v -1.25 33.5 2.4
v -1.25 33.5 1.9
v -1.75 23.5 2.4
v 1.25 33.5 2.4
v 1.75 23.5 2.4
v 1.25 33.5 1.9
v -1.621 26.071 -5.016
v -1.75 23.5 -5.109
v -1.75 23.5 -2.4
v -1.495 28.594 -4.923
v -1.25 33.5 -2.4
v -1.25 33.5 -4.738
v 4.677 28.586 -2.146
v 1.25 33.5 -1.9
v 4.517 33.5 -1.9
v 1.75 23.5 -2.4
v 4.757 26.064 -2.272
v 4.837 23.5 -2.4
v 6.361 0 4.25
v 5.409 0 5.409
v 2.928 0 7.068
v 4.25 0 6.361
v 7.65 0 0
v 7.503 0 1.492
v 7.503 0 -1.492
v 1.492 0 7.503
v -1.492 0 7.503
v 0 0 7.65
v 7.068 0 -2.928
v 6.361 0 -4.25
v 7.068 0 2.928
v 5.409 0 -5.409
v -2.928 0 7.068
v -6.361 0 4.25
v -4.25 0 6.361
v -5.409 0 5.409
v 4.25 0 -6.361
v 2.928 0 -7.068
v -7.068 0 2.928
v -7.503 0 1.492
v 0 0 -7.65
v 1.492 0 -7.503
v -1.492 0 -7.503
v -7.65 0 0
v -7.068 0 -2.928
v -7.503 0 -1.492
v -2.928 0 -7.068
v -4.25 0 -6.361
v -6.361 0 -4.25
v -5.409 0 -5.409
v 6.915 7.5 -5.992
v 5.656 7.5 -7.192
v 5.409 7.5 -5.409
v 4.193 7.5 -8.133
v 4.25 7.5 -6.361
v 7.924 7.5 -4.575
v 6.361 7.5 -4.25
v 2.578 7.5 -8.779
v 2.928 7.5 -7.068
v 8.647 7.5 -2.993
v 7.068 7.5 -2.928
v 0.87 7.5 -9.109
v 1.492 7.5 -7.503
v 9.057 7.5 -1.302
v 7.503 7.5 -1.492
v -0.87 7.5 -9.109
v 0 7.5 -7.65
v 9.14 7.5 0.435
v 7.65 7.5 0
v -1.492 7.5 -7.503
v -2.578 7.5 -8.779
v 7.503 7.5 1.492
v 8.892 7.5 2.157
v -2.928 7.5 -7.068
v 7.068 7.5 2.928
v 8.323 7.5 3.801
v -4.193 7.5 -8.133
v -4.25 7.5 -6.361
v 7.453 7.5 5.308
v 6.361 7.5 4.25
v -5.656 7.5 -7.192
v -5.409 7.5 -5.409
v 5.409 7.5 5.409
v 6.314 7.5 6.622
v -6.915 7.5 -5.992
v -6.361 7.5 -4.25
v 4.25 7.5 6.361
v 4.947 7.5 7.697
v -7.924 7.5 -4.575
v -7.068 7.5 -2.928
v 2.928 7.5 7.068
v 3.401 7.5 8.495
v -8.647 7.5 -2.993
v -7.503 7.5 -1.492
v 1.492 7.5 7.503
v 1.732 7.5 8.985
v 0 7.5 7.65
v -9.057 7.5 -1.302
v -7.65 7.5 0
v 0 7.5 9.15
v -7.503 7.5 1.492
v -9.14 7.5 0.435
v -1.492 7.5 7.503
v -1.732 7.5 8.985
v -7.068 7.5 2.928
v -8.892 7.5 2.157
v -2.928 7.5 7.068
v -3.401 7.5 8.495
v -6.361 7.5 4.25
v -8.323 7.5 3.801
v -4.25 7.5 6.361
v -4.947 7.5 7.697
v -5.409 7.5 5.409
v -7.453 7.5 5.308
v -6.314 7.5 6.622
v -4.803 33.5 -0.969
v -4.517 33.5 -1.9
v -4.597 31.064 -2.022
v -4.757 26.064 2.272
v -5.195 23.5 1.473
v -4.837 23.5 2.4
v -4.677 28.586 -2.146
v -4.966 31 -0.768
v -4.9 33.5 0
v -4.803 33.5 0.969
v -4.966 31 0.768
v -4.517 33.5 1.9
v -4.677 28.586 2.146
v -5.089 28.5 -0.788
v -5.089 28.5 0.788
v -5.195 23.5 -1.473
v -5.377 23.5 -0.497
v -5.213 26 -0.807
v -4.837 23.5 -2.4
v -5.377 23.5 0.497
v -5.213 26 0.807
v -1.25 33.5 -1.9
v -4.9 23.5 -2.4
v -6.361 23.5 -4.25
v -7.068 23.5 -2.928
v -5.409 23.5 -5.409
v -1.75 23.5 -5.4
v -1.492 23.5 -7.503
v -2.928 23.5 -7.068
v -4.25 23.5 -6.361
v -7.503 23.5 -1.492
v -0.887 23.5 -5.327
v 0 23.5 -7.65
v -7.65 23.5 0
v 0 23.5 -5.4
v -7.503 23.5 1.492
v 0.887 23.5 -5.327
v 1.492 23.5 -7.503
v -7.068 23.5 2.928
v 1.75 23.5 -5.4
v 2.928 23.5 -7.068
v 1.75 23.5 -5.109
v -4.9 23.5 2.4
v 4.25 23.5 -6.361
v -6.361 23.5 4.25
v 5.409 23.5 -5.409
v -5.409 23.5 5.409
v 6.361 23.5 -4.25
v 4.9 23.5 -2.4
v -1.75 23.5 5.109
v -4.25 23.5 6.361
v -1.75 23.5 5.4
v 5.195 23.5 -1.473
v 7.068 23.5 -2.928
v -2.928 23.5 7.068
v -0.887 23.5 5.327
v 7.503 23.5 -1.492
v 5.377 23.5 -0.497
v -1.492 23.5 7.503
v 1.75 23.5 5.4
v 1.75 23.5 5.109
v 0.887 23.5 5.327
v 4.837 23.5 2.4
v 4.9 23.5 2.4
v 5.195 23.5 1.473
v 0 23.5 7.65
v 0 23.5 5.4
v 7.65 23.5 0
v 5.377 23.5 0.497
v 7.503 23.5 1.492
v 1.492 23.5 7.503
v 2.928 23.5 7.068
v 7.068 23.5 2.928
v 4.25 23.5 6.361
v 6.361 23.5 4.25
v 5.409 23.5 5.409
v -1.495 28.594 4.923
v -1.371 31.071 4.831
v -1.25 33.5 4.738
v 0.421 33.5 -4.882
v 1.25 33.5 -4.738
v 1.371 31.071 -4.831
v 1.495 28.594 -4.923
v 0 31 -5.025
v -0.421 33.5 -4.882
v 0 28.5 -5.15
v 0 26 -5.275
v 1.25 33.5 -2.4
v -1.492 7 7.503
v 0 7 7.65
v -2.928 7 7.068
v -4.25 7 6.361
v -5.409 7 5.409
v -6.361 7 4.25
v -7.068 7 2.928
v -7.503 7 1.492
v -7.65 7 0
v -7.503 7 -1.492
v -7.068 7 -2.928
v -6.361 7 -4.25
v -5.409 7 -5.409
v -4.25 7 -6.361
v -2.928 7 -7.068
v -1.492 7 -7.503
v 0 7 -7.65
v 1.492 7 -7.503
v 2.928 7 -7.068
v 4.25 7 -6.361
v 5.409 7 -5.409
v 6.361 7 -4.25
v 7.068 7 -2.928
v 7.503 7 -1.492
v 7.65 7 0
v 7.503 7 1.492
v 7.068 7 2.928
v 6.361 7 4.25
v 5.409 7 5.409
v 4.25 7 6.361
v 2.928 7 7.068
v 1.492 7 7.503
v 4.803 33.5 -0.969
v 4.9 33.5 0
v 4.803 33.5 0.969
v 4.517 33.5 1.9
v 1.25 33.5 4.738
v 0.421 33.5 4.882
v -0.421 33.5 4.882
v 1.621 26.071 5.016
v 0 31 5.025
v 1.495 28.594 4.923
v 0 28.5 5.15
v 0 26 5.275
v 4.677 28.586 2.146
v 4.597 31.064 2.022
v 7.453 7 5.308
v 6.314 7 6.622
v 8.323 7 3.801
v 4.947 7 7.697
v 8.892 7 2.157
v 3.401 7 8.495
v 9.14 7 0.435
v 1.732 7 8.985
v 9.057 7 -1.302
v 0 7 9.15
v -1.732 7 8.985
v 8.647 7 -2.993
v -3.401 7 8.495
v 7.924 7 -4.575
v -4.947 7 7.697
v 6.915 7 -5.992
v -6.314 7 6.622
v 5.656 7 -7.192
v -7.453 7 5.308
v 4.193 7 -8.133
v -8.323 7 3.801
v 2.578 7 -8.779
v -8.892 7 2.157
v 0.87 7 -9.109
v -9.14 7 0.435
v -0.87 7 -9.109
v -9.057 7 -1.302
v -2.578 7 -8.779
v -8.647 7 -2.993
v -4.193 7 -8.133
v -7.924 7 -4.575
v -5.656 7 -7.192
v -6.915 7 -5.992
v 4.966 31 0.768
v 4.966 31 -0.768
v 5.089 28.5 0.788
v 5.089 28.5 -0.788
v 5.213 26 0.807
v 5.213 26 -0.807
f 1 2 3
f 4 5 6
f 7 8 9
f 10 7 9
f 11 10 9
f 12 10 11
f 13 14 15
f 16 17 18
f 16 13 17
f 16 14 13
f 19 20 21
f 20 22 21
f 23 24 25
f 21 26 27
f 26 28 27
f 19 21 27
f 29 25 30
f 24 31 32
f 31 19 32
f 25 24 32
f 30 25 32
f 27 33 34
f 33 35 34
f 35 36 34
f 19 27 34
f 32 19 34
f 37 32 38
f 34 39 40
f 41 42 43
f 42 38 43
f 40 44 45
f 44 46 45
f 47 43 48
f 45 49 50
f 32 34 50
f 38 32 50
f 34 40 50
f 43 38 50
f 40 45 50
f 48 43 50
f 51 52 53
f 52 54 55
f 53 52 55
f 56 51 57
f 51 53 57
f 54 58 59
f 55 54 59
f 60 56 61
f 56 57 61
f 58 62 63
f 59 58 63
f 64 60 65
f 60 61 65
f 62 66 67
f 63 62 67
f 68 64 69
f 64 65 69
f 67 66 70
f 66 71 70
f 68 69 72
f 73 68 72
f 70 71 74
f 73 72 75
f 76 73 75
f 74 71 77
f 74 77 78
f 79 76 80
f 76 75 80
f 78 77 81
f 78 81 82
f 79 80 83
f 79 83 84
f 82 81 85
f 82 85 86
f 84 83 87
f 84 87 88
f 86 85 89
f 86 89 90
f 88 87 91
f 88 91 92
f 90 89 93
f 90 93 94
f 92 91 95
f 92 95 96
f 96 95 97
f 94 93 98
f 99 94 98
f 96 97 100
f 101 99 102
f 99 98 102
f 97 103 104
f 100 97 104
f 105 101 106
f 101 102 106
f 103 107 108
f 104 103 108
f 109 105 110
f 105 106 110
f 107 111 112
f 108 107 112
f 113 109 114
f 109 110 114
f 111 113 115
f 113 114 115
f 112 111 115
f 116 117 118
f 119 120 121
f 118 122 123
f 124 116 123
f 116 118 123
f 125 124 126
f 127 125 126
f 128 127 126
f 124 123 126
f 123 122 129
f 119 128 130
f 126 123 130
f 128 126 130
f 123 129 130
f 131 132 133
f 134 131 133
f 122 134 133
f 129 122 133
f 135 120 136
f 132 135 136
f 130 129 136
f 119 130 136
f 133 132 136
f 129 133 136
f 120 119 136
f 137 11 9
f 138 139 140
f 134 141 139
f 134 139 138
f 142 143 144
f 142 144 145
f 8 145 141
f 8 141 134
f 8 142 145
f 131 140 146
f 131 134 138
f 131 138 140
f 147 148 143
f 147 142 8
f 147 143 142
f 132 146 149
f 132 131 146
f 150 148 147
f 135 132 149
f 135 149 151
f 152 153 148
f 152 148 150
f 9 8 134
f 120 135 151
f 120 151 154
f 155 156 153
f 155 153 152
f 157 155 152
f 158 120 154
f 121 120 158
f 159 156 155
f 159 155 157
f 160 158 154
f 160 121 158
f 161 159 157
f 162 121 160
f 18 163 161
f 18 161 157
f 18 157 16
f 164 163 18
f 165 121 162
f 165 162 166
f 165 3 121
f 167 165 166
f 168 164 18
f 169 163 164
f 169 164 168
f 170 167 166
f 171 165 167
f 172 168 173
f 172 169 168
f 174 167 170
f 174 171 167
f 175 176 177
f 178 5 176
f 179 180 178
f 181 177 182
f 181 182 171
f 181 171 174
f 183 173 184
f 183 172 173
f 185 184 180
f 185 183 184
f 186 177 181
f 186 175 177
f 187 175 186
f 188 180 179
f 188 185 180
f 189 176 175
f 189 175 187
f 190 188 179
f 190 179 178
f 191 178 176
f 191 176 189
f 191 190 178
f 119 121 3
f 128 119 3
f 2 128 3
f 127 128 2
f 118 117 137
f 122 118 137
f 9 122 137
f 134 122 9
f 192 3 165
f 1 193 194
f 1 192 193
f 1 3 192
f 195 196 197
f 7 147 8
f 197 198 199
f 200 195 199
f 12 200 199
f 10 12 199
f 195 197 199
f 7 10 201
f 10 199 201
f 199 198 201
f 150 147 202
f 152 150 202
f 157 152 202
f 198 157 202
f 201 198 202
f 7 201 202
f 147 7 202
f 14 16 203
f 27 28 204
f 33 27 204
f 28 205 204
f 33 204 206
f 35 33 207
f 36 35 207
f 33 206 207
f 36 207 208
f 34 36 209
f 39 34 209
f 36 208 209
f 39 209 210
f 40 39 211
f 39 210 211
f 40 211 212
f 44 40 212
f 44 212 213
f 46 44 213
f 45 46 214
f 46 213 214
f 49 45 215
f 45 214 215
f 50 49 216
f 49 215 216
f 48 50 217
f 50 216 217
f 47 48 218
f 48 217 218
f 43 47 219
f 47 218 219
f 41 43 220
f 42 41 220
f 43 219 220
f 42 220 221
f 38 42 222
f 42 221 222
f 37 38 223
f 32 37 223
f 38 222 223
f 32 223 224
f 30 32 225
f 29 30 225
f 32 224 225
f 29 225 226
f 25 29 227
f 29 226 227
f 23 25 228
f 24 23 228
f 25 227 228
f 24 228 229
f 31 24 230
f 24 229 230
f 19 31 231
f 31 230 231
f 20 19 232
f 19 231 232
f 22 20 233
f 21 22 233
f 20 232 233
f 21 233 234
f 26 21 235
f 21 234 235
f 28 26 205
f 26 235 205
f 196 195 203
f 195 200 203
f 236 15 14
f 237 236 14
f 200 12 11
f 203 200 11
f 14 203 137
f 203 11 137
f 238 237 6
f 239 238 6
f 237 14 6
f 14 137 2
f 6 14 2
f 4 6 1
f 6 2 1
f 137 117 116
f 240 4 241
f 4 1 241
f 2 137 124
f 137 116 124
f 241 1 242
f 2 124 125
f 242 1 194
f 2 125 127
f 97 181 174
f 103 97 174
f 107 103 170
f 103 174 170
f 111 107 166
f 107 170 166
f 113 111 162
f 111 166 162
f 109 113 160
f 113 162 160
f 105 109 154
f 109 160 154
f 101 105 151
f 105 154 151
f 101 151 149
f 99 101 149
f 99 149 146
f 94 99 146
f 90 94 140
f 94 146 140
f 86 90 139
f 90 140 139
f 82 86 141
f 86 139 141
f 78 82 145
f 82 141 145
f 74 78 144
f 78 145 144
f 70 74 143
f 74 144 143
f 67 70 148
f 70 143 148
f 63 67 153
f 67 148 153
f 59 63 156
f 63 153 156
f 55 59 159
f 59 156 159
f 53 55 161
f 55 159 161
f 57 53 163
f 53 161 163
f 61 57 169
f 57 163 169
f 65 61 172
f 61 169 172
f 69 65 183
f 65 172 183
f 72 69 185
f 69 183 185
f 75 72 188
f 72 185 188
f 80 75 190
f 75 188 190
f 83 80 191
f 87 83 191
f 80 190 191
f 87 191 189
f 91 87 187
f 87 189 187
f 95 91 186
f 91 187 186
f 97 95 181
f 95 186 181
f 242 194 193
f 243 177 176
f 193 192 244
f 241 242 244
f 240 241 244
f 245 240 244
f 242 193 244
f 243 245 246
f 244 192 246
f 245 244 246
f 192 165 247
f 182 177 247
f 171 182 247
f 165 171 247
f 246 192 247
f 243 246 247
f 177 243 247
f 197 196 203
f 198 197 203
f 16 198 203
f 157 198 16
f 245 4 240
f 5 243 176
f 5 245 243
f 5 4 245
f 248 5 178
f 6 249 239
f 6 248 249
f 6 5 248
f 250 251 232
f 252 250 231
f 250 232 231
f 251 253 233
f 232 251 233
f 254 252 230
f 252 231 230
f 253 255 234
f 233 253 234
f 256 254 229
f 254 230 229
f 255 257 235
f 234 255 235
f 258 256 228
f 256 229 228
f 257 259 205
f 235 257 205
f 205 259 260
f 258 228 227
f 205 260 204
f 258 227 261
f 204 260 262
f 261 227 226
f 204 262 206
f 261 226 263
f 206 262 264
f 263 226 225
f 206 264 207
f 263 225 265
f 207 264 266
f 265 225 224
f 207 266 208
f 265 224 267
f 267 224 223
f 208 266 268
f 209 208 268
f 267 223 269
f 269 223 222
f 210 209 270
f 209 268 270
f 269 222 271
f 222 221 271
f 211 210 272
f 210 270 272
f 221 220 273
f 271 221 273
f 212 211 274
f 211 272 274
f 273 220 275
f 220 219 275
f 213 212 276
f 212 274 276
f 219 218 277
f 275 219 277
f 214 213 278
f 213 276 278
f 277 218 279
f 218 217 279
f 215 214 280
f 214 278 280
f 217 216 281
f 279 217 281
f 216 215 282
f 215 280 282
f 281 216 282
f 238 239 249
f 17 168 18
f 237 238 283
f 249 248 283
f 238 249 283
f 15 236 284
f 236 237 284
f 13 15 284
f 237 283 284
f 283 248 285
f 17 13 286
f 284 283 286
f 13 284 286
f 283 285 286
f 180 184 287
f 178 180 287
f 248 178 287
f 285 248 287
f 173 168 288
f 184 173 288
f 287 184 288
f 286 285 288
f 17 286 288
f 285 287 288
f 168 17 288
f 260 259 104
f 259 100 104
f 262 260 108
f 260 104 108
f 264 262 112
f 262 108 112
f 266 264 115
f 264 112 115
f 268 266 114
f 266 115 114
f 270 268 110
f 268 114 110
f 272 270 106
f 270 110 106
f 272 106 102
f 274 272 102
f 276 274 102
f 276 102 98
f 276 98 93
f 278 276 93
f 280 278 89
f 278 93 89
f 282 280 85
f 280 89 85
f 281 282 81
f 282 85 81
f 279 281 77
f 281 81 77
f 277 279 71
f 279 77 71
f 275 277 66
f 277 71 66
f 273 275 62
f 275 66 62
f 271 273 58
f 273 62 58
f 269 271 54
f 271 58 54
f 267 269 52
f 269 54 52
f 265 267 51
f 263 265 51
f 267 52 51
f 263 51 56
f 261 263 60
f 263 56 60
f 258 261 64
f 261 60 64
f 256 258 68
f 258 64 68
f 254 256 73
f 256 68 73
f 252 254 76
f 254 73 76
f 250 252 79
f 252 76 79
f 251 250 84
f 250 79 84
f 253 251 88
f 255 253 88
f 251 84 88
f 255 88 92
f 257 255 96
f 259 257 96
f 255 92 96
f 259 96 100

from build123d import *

# Parameters (mm, degrees)
SKETCH_594_R           = 7.65
CUT_EXTRUDE_2199_DEPTH = 10
CHAMFER_START          = -4.9
CHAMFER_1_2_DEPTH      = 3.6500001
CHAMFER_START_2        = 1.2499999
CHAMFER_1_3_DEPTH      = 3.6500001
CHAMFER_START_3        = -5.4
CHAMFER_1_4_DEPTH      = 3
CHAMFER_START_4        = 2.4
CHAMFER_1_5_DEPTH      = 3
CHAMFER_START_5        = -2.4
CHAMFER_1_6_DEPTH      = 4.8


with BuildPart() as part:
    # Sketch 286 → Revolve 549 (revolve)
    with BuildSketch(Plane.XY, mode=Mode.PRIVATE) as revolve_549_sk:
        Polygon((0, 0), (7.65, 0), (7.65, 7), (9.15, 7), (9.15, 7.5), (7.65, 7.5), (7.65, 33.5), (0, 33.5), align=None)
    revolve(revolve_549_sk.sketch.rotate(Axis((0, 16.255686087, 0), (0, -1, 0)), 90), axis=Axis((0, 16.255686087, 0), (0, -1, 0)))

    # Sketch 594 → Cut-Extrude 2199 (cut)
    with BuildSketch(Plane(origin=(0, 33.5, 0), x_dir=(1, 0, 0), z_dir=(0, 1, 0))):
        with Locations(Location((0, 0, 0), (0, 0, 270))):
            Circle(SKETCH_594_R)
        with BuildLine():
            Line((-1.75, 2.4), (-1.75, 5.108571229))
            ThreePointArc((-1.75, 5.108571229), (0, 5.4), (1.75, 5.108571229))
            Line((1.75, 5.108571229), (1.75, 2.4))
            Line((1.75, 2.4), (4.837354649, 2.4))
            ThreePointArc((4.837354649, 2.4), (5.4, 0), (4.837354649, -2.4))
            Line((4.837354649, -2.4), (1.75, -2.4))
            Line((1.75, -2.4), (1.75, -5.108571229))
            ThreePointArc((1.75, -5.108571229), (0, -5.4), (-1.75, -5.108571229))
            Line((-1.75, -5.108571229), (-1.75, -2.4))
            Line((-1.75, -2.4), (-4.837354649, -2.4))
            ThreePointArc((-4.837354649, -2.4), (-5.4, 0), (-4.837354649, 2.4))
            Line((-4.837354649, 2.4), (-1.75, 2.4))
        make_face(mode=Mode.SUBTRACT)
    extrude(amount=-CUT_EXTRUDE_2199_DEPTH, mode=Mode.SUBTRACT)

    # Фаска1: read off the stored shape, not the designer's step
    # Фаска1 outline → Фаска1 (revolve, cut)
    with BuildSketch(Plane.XY):
        Polygon((5.4, 33.5), (4.9, 33.5), (5.4, 23.5), align=None)
    revolve(axis=Axis((0, 0, 0), (0, 1, 0)), mode=Mode.SUBTRACT)

    # Chamfer 1 2 outline → Chamfer 1 2 (cut)
    with BuildSketch(Plane.YZ.offset(CHAMFER_START)):
        Polygon((23.5, 2.4), (33.5, 1.9), (33.5, 2.4), align=None)
        Polygon((33.5, -2.4), (33.5, -1.9), (23.5, -2.4), align=None)
    extrude(amount=CHAMFER_1_2_DEPTH, mode=Mode.SUBTRACT)

    # Chamfer 1 3 outline → Chamfer 1 3 (cut)
    with BuildSketch(Plane.YZ.offset(CHAMFER_START_2)):
        Polygon((23.5, 2.4), (33.5, 1.9), (33.5, 2.4), align=None)
        Polygon((33.5, -2.4), (33.5, -1.9), (23.5, -2.4), align=None)
    extrude(amount=CHAMFER_1_3_DEPTH, mode=Mode.SUBTRACT)

    # Chamfer 1 4 outline → Chamfer 1 4 (cut)
    with BuildSketch(Plane.XY.offset(CHAMFER_START_3)):
        Polygon((1.75, 33.5), (1.249999967, 33.5), (1.75, 23.5), align=None)
        Polygon((-1.75, 23.5), (-1.25, 33.5), (-1.75, 33.5), align=None)
    extrude(amount=CHAMFER_1_4_DEPTH, mode=Mode.SUBTRACT)

    # Chamfer 1 5 outline → Chamfer 1 5 (cut)
    with BuildSketch(Plane.XY.offset(CHAMFER_START_4)):
        Polygon((1.75, 33.5), (1.249999967, 33.5), (1.75, 23.5), align=None)
        Polygon((-1.75, 23.5), (-1.25, 33.5), (-1.75, 33.5), align=None)
    extrude(amount=CHAMFER_1_5_DEPTH, mode=Mode.SUBTRACT)

    # Chamfer 1 6 outline → Chamfer 1 6 (add)
    with BuildSketch(Plane.XY.offset(CHAMFER_START_5)):
        Polygon((1.75, 23.5), (1.25, 33.5), (1.2499999, 23.5), align=None)
        Polygon((-1.2499999, 23.5), (-1.2499999, 33.5), (-1.75, 23.5), align=None)
    extrude(amount=CHAMFER_1_6_DEPTH)


solid = part.part
